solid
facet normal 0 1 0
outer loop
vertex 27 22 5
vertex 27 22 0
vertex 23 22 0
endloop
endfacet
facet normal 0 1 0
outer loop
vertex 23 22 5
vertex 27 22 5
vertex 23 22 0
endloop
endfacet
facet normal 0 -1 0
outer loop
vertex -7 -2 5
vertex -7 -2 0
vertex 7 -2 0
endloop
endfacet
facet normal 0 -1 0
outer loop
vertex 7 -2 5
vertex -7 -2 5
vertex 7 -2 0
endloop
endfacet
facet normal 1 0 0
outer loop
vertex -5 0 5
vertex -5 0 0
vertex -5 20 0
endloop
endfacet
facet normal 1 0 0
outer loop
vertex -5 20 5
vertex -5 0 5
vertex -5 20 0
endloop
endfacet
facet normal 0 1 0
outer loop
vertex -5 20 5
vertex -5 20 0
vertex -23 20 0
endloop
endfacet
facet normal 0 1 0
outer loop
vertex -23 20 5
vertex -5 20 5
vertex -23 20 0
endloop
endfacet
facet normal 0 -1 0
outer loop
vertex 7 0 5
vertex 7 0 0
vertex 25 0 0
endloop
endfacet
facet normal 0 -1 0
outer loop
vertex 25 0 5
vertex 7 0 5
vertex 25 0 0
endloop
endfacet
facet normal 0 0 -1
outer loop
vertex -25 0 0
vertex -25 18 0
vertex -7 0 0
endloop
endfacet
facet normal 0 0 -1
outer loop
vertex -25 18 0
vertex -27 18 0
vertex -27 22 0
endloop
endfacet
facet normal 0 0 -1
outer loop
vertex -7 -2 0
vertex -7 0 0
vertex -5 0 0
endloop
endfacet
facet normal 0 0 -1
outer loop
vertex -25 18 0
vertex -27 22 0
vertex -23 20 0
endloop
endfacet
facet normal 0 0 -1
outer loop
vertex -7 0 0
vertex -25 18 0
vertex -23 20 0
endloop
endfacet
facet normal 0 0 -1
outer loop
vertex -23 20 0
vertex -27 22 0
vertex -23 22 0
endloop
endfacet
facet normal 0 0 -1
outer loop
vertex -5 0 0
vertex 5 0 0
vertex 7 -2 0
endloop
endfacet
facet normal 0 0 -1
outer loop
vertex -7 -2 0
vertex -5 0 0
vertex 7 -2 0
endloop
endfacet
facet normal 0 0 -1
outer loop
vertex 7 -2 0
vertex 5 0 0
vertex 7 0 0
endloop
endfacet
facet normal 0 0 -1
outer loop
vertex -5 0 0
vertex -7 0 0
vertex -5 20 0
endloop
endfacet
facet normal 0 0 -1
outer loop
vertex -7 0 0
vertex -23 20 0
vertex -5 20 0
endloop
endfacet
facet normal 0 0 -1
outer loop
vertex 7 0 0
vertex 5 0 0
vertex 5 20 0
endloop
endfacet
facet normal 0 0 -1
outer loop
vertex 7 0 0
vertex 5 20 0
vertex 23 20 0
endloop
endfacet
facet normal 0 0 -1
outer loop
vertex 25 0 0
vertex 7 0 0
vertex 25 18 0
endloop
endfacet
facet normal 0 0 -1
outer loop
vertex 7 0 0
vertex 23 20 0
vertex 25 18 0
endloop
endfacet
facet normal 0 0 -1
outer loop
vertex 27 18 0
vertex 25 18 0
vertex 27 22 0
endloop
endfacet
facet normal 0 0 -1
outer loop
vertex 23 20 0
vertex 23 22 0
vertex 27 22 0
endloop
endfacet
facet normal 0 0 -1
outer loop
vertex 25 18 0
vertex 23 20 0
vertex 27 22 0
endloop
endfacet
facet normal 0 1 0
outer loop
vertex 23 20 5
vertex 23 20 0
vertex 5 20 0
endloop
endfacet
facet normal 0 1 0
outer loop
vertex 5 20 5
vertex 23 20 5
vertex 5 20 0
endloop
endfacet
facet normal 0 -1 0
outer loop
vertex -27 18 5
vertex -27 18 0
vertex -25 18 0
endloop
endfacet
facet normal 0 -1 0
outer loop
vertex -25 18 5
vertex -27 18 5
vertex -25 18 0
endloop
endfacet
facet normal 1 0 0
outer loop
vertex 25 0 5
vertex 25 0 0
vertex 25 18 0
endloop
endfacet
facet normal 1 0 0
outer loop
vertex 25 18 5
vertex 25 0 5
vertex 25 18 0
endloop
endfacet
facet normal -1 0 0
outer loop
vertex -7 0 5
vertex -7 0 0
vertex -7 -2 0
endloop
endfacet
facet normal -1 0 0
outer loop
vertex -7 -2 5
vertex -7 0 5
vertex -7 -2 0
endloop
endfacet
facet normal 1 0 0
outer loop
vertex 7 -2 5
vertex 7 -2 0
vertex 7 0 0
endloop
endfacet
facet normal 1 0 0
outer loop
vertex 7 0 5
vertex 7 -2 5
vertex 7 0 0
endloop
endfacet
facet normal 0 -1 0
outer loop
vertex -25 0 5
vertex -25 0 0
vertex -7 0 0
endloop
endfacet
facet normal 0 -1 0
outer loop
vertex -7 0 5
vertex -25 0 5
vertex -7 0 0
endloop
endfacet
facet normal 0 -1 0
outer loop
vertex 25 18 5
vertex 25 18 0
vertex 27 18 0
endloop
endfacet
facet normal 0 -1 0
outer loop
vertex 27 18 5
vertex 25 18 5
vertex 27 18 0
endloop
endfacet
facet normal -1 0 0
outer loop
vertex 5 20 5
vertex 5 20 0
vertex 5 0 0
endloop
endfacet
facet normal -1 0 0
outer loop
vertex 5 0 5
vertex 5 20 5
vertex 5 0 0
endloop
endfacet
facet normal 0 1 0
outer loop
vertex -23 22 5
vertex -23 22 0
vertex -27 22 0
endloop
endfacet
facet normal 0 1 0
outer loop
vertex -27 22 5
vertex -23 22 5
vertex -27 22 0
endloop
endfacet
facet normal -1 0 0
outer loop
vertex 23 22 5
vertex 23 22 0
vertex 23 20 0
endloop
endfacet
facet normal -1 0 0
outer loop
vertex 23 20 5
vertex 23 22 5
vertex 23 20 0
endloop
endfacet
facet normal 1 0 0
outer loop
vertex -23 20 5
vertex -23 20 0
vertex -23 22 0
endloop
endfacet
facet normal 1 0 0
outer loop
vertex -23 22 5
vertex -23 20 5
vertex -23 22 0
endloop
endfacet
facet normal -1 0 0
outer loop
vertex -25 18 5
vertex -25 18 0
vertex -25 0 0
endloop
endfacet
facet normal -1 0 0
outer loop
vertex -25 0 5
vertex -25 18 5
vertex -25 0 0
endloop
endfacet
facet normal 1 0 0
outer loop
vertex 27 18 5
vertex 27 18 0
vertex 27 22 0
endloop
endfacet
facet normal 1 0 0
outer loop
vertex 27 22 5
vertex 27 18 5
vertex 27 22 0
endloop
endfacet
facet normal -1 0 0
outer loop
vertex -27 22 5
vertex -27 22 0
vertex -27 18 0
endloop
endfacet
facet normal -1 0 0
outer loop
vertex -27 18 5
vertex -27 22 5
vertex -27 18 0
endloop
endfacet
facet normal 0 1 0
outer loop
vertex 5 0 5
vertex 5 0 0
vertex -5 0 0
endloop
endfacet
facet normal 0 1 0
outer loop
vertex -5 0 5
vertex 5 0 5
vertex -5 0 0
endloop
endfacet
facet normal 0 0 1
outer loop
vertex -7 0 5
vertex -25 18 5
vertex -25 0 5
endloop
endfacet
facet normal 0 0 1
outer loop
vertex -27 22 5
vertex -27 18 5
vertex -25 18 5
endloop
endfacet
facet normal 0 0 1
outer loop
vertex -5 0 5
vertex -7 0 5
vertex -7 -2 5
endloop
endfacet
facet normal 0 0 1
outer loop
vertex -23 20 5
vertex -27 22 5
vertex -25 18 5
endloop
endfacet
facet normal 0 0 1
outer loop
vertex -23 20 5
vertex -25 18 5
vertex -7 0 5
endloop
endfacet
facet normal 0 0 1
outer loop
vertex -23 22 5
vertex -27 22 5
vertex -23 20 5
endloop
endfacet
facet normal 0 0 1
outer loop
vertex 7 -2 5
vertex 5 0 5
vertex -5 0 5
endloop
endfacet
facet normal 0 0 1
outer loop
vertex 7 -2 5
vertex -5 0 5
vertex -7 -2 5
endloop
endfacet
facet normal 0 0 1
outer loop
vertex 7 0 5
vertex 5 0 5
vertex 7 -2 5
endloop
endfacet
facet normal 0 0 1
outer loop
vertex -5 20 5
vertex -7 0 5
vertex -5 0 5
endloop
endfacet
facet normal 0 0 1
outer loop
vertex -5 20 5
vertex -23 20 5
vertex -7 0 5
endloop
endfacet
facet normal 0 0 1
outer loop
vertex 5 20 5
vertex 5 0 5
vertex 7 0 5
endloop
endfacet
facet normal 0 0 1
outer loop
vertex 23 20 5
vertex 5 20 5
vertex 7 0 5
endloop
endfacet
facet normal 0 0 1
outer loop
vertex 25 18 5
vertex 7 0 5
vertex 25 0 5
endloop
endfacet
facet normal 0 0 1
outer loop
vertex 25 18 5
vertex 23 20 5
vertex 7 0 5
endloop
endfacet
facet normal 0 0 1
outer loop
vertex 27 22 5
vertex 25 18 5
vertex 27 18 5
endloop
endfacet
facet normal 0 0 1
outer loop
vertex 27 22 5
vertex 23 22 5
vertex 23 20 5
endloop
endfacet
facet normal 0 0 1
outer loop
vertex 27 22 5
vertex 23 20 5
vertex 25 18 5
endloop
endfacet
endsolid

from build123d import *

# Parameters (mm, degrees)
F1_DEPTH = 5


with BuildPart() as f1:
    # F0 (on Top) → F1 (new body)
    with BuildSketch(Plane.XY):
        Polygon((5, 0), (0, 0), (-5, 0), (-7, 0), (-7, -2), (0, -2), (7, -2), (7, 0), align=None)
        Polygon((5, 20), (5, 0), (7, 0), (25, 0), (25, 18), (25, 20), (23, 20), align=None)
        Polygon((-7, 0), (-5, 0), (-5, 20), (-23, 20), (-25, 20), (-25, 18), (-25, 0), align=None)
        Polygon((23, 22), (23, 20), (25, 20), (25, 18), (27, 18), (27, 22), align=None)
        Polygon((-25, 20), (-23, 20), (-23, 22), (-27, 22), (-27, 18), (-25, 18), align=None)
    extrude(amount=F1_DEPTH)


solid = f1.part
